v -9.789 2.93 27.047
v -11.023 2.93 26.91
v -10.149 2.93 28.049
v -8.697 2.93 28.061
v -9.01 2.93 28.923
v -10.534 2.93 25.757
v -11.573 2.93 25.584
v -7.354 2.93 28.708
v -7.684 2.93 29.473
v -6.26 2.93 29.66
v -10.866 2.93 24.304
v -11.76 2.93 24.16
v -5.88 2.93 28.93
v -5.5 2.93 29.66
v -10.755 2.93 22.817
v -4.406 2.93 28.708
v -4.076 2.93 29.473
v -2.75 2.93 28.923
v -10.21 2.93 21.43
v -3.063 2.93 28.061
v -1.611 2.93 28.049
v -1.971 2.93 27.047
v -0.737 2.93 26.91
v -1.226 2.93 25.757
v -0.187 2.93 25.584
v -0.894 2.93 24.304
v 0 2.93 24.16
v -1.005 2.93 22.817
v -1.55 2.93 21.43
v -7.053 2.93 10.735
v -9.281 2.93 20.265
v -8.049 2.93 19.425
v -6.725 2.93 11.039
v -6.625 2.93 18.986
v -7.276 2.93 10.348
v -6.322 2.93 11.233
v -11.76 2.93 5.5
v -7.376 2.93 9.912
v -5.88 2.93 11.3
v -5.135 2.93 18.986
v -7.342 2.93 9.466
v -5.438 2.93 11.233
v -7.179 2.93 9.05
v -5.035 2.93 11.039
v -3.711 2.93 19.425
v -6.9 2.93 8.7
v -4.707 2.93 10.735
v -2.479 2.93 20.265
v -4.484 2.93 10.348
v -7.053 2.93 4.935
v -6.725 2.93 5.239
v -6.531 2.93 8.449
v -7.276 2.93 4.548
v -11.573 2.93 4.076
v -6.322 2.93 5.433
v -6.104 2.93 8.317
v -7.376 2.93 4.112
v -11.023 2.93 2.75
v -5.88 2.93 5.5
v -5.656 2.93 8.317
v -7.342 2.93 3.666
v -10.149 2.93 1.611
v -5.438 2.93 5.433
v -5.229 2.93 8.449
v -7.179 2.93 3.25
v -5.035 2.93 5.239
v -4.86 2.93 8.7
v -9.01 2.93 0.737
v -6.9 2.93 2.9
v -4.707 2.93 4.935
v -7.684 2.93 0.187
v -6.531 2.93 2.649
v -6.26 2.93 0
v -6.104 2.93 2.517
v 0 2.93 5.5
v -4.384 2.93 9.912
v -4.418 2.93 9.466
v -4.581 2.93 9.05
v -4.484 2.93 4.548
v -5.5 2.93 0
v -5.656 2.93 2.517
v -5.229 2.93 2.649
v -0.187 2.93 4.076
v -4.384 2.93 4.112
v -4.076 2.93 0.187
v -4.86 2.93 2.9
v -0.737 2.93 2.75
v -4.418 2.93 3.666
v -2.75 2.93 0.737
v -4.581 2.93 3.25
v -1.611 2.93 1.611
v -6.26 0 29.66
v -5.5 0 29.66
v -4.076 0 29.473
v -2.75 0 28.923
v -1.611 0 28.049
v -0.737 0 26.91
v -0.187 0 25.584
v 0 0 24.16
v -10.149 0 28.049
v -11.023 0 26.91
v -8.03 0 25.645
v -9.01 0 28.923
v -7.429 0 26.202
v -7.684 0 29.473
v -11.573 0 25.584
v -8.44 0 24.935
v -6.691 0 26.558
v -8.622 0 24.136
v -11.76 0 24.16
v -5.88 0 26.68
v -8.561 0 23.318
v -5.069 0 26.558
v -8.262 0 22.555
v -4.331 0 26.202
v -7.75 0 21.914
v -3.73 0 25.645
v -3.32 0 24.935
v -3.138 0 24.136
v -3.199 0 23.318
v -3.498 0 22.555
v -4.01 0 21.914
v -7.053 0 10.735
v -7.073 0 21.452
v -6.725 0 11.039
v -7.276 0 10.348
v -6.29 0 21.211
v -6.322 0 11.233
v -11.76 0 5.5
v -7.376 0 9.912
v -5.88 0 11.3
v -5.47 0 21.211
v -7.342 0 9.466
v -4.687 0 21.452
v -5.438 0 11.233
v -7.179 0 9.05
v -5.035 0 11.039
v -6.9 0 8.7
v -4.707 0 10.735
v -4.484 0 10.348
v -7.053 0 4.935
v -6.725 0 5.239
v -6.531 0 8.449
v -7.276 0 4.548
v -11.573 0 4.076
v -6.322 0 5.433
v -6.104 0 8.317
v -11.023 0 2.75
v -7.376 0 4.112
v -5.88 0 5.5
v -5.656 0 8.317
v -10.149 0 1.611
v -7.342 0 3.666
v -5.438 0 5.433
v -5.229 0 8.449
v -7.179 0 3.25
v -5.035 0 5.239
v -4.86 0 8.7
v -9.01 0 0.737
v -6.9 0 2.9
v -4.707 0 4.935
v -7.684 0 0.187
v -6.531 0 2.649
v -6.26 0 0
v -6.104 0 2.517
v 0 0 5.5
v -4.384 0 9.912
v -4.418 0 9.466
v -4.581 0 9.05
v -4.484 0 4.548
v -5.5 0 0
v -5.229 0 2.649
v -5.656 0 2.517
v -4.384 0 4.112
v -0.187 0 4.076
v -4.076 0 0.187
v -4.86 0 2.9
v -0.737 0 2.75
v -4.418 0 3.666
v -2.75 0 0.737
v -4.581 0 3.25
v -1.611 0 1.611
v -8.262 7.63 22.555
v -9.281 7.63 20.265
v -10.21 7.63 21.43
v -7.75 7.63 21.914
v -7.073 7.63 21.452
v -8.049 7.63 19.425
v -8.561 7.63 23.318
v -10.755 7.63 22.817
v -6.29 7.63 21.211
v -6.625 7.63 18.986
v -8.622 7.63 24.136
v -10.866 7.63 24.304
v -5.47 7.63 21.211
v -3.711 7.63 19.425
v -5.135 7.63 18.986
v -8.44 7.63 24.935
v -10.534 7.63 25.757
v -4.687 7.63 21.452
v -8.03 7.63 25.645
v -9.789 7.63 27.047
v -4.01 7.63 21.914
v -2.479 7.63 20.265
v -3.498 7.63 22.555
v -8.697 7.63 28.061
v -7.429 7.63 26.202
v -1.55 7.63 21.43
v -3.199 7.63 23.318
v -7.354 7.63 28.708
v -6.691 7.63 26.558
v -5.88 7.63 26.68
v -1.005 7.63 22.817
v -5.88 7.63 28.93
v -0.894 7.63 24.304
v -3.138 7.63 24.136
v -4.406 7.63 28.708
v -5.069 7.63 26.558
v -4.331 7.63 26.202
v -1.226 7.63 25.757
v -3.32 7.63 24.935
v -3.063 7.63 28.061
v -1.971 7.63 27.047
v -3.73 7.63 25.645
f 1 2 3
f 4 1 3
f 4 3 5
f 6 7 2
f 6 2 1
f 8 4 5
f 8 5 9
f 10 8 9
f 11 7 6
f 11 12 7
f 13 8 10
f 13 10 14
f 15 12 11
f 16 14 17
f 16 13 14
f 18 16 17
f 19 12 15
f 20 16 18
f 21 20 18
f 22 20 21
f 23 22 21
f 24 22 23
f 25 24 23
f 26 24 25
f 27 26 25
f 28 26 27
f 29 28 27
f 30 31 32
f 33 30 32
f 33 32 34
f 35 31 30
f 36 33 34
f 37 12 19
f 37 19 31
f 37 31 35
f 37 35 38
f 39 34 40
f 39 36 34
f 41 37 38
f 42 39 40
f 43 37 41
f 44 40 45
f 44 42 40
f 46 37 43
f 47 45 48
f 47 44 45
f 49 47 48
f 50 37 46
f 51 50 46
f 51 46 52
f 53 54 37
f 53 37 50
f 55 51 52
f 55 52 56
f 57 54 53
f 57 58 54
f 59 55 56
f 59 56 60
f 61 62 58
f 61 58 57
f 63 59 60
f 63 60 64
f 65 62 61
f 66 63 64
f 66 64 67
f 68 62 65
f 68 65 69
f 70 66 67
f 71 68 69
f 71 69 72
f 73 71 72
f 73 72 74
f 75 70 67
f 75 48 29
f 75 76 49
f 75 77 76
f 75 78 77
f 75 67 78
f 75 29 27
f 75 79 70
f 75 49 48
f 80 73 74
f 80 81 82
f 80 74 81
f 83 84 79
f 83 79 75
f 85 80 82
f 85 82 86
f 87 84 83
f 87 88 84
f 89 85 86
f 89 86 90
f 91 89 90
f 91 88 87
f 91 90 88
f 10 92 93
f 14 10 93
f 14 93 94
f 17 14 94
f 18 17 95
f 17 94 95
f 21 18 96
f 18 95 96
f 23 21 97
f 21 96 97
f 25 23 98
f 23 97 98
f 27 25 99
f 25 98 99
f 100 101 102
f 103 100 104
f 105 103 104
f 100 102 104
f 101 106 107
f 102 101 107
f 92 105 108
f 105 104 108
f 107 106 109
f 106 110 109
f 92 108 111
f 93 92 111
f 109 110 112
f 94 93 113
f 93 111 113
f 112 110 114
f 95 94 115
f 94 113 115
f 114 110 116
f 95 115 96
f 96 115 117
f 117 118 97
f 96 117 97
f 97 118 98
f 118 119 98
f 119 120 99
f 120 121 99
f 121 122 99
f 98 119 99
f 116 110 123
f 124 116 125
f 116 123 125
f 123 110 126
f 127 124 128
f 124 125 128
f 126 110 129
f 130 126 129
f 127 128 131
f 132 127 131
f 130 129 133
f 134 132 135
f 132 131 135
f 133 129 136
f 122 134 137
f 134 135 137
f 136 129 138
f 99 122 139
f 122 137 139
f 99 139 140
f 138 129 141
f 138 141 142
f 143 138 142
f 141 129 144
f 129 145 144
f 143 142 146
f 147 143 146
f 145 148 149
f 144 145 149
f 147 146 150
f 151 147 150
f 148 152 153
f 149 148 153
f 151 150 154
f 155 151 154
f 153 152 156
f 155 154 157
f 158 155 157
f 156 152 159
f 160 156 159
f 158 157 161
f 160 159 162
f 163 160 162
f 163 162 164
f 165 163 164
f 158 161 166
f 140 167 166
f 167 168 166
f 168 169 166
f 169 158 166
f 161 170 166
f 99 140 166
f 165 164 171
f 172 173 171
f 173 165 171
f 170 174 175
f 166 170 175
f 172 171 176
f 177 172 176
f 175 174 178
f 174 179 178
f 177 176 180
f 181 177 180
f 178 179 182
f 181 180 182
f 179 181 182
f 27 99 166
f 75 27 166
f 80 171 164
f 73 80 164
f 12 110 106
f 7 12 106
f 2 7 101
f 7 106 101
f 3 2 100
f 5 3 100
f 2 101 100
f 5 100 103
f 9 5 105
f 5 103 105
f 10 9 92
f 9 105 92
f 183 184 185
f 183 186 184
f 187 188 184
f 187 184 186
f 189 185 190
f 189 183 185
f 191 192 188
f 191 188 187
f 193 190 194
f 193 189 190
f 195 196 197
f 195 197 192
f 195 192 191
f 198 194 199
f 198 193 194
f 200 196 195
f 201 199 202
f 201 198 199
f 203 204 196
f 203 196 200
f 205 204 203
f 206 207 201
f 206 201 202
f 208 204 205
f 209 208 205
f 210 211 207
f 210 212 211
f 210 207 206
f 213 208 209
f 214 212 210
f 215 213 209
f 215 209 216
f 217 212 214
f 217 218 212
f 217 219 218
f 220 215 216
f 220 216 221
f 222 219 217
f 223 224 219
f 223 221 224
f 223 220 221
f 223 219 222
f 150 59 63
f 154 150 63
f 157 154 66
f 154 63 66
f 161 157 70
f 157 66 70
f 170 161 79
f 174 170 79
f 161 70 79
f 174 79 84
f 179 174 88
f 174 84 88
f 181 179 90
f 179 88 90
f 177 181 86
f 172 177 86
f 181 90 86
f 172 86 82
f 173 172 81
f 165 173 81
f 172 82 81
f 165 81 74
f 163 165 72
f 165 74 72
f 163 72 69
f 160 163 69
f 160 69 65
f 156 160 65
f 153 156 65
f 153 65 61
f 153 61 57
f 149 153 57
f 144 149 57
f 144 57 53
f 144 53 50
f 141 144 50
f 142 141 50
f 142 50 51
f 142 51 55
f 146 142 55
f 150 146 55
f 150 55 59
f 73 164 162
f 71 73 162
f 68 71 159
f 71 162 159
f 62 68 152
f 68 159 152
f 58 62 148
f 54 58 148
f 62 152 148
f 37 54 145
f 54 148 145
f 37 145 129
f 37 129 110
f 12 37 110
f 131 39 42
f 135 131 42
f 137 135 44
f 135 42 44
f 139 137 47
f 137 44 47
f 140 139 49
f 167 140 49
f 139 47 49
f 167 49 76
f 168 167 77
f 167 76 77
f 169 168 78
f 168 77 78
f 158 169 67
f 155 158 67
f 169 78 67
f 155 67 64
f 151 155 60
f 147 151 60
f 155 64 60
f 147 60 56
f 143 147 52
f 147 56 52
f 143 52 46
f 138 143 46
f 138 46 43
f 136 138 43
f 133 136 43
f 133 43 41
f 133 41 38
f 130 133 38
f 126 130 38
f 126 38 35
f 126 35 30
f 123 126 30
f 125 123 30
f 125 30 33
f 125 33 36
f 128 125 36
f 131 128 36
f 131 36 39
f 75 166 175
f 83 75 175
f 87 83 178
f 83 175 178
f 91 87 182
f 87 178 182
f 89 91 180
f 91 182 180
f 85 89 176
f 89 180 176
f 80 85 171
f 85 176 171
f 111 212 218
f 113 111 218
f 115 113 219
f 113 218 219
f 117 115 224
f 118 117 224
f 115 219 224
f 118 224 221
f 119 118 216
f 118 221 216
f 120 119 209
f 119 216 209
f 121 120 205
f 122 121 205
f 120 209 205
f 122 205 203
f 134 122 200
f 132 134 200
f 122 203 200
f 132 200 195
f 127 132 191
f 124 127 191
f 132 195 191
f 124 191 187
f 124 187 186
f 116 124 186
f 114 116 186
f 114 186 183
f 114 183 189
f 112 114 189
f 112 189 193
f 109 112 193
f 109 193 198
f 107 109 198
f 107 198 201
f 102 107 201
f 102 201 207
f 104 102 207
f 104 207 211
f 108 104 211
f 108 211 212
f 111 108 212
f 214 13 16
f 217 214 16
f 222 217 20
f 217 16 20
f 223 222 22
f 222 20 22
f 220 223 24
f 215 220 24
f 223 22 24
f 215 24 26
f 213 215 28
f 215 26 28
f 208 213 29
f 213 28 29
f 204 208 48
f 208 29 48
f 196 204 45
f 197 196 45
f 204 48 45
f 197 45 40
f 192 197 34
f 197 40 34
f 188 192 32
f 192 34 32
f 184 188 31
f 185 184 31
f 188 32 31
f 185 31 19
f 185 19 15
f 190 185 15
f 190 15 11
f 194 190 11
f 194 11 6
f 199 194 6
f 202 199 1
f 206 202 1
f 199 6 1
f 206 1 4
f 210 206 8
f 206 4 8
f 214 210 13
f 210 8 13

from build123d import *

# Parameters (mm, degrees)
BOSS_EXTRUDE1_DEPTH = 2.93
SKETCH2_R           = 5
BOSS_EXTRUDE2_DEPTH = 4.7
CUT_EXTRUDE1_REACH  = 34.806
SKETCH3_R           = 2.75
CUT_EXTRUDE2_REACH  = 34.251
SKETCH4_R           = 1.5


with BuildPart() as part:
    # Sketch1 → Boss-Extrude1 (new body)
    with BuildSketch(Plane(origin=(0, 0, 0), x_dir=(1, 0, 0), z_dir=(0, 1, 0))):
        with BuildLine():
            Line((-5.5, 0), (-6.26, 0))
            ThreePointArc((-6.26, 0), (-10.149087297, -1.610912703), (-11.76, -5.5))
            Line((-11.76, -5.5), (-11.76, -24.16))
            ThreePointArc((-11.76, -24.16), (-10.149087297, -28.049087297), (-6.26, -29.66))
            Line((-6.26, -29.66), (-5.5, -29.66))
            ThreePointArc((-5.5, -29.66), (-1.610912703, -28.049087297), (0, -24.16))
            Line((0, -24.16), (0, -5.5))
            ThreePointArc((0, -5.5), (-1.610912703, -1.610912703), (-5.5, 0))
        make_face()
    extrude(amount=BOSS_EXTRUDE1_DEPTH)

    # Sketch2 → Boss-Extrude2 (add)
    with BuildSketch(Plane(origin=(0, 2.93, 0), x_dir=(1, 0, 0), z_dir=(0, 1, 0))):
        with Locations(Location((-5.88, -23.93, 0), (0, 0, 270))):
            Circle(SKETCH2_R)
    extrude(amount=BOSS_EXTRUDE2_DEPTH)

    # Sketch3 → Cut-Extrude1 (cut, up to next)
    with BuildSketch(Plane(origin=(0, 7.63, 0), x_dir=(1, 0, 0), z_dir=(0, 1, 0)), mode=Mode.PRIVATE) as cut_extrude1_sk1:
        with Locations(Location((-5.88, -23.93, 0), (0, 0, 270))):
            Circle(SKETCH3_R)
    cut_extrude1_tool1 = extrude(cut_extrude1_sk1.sketch, amount=-CUT_EXTRUDE1_REACH, mode=Mode.PRIVATE) & part.part
    add(cut_extrude1_tool1.solids().sort_by_distance((-5.88, 7.63, 23.93))[0], mode=Mode.SUBTRACT)

    # Sketch4 → Cut-Extrude2 (cut, up to next)
    with BuildSketch(Plane(origin=(0, 2.93, 0), x_dir=(1, 0, 0), z_dir=(0, 1, 0)), mode=Mode.PRIVATE) as cut_extrude2_sk1:
        with Locations(Location((-5.88, -4, 0), (0, 0, 270))):
            Circle(SKETCH4_R)
    cut_extrude2_tool1 = extrude(cut_extrude2_sk1.sketch, amount=-CUT_EXTRUDE2_REACH, mode=Mode.PRIVATE) & part.part
    # Sketch4 → Cut-Extrude2 (cut, up to next)
    with BuildSketch(Plane(origin=(0, 2.93, 0), x_dir=(1, 0, 0), z_dir=(0, 1, 0)), mode=Mode.PRIVATE) as cut_extrude2_sk2:
        with Locations(Location((-5.88, -9.8, 0), (0, 0, 270))):
            Circle(SKETCH4_R)
    cut_extrude2_tool2 = extrude(cut_extrude2_sk2.sketch, amount=-CUT_EXTRUDE2_REACH, mode=Mode.PRIVATE) & part.part
    add(cut_extrude2_tool1.solids().sort_by_distance((-5.88, 2.93, 4))[0], mode=Mode.SUBTRACT)
    add(cut_extrude2_tool2.solids().sort_by_distance((-5.88, 2.93, 9.8))[0], mode=Mode.SUBTRACT)


solid = part.part
